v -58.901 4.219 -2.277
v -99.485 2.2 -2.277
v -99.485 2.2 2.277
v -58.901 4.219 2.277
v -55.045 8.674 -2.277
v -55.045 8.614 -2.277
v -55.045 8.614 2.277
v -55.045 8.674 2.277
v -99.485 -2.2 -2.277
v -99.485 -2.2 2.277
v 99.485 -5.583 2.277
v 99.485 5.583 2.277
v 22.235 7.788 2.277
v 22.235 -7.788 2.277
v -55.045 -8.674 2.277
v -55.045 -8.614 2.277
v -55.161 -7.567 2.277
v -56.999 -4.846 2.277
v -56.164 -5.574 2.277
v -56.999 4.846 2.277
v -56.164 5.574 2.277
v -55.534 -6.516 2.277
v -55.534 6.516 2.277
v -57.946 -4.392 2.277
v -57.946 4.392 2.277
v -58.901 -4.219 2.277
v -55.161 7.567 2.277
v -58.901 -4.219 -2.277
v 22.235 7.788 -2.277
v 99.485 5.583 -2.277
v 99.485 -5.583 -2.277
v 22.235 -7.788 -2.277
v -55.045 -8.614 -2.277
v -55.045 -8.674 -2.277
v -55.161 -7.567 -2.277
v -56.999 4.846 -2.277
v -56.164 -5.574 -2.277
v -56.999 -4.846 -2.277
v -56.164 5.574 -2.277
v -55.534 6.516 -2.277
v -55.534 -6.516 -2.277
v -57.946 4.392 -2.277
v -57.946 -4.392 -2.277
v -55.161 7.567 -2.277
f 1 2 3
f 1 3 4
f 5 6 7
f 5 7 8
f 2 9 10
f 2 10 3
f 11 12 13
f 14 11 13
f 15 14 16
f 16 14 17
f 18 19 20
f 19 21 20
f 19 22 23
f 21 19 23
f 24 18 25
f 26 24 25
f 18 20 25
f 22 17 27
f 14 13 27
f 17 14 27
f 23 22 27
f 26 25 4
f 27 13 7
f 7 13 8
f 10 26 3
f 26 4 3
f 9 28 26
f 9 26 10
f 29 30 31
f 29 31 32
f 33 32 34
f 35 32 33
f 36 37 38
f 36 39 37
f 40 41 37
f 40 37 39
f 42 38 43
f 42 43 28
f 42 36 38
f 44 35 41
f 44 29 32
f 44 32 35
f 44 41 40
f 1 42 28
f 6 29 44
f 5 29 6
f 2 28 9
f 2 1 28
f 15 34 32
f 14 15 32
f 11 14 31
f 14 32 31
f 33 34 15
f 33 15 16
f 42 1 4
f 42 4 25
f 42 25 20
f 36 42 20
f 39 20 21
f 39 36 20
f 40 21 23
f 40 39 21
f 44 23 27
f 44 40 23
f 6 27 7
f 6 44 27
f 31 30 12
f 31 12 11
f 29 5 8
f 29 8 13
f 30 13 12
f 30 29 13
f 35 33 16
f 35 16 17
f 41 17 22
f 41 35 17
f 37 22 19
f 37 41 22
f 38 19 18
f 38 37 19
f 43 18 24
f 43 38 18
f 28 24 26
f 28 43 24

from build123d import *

# Parameters (mm, degrees)
BOSS_EXTRUDE1_DEPTH      = 2.07
BOSS_EXTRUDE1_DEPTH_BACK = 2.07
SCALE1_SCALE_X           = 1.01
SCALE1_SCALE_Y           = 1.1
SCALE1_SCALE_Z           = 1.1


with BuildPart() as part:
    # Sketch1 → Boss-Extrude1 (new, two sides: drawn at the far end of the back side and taken through both)
    with BuildSketch(Plane.XY.offset(-BOSS_EXTRUDE1_DEPTH_BACK)):
        with BuildLine():
            Line((-98.5, -2), (-98.5, 2))
            Line((-98.5, 2), (-58.317523483, 3.835))
            ThreePointArc((-58.317523483, 3.835), (-55.607777146, 5.067676748), (-54.5, 7.830835622))
            Line((-54.5, 7.830835622), (-54.5, 7.885))
            add(Edge.make_bspline(
                [(-54.5, 7.885), (22.028887168, 7.680718763), (98.5, 5.075)],
                knots=[0, 0, 0, 1, 1, 1], degree=2))
            Line((98.5, 5.075), (98.5, -5.075))
            add(Edge.make_bspline(
                [(-54.5, -7.885), (22.028887168, -7.680718763), (98.5, -5.075)],
                knots=[0, 0, 0, 1, 1, 1], degree=2))
            Line((-54.5, -7.885), (-54.5, -7.830835622))
            ThreePointArc((-54.5, -7.830835622), (-55.607777146, -5.067676748), (-58.317523483, -3.835))
            Line((-58.317523483, -3.835), (-98.5, -2))
        make_face()
    extrude(amount=BOSS_EXTRUDE1_DEPTH + BOSS_EXTRUDE1_DEPTH_BACK)


with BuildPart() as part_1:
    # Scale1: scaled about (0, 0, 0)
    add(part.part.scale((SCALE1_SCALE_X, SCALE1_SCALE_Y, SCALE1_SCALE_Z), about=(0, 0, 0)))


solid = part_1.part
